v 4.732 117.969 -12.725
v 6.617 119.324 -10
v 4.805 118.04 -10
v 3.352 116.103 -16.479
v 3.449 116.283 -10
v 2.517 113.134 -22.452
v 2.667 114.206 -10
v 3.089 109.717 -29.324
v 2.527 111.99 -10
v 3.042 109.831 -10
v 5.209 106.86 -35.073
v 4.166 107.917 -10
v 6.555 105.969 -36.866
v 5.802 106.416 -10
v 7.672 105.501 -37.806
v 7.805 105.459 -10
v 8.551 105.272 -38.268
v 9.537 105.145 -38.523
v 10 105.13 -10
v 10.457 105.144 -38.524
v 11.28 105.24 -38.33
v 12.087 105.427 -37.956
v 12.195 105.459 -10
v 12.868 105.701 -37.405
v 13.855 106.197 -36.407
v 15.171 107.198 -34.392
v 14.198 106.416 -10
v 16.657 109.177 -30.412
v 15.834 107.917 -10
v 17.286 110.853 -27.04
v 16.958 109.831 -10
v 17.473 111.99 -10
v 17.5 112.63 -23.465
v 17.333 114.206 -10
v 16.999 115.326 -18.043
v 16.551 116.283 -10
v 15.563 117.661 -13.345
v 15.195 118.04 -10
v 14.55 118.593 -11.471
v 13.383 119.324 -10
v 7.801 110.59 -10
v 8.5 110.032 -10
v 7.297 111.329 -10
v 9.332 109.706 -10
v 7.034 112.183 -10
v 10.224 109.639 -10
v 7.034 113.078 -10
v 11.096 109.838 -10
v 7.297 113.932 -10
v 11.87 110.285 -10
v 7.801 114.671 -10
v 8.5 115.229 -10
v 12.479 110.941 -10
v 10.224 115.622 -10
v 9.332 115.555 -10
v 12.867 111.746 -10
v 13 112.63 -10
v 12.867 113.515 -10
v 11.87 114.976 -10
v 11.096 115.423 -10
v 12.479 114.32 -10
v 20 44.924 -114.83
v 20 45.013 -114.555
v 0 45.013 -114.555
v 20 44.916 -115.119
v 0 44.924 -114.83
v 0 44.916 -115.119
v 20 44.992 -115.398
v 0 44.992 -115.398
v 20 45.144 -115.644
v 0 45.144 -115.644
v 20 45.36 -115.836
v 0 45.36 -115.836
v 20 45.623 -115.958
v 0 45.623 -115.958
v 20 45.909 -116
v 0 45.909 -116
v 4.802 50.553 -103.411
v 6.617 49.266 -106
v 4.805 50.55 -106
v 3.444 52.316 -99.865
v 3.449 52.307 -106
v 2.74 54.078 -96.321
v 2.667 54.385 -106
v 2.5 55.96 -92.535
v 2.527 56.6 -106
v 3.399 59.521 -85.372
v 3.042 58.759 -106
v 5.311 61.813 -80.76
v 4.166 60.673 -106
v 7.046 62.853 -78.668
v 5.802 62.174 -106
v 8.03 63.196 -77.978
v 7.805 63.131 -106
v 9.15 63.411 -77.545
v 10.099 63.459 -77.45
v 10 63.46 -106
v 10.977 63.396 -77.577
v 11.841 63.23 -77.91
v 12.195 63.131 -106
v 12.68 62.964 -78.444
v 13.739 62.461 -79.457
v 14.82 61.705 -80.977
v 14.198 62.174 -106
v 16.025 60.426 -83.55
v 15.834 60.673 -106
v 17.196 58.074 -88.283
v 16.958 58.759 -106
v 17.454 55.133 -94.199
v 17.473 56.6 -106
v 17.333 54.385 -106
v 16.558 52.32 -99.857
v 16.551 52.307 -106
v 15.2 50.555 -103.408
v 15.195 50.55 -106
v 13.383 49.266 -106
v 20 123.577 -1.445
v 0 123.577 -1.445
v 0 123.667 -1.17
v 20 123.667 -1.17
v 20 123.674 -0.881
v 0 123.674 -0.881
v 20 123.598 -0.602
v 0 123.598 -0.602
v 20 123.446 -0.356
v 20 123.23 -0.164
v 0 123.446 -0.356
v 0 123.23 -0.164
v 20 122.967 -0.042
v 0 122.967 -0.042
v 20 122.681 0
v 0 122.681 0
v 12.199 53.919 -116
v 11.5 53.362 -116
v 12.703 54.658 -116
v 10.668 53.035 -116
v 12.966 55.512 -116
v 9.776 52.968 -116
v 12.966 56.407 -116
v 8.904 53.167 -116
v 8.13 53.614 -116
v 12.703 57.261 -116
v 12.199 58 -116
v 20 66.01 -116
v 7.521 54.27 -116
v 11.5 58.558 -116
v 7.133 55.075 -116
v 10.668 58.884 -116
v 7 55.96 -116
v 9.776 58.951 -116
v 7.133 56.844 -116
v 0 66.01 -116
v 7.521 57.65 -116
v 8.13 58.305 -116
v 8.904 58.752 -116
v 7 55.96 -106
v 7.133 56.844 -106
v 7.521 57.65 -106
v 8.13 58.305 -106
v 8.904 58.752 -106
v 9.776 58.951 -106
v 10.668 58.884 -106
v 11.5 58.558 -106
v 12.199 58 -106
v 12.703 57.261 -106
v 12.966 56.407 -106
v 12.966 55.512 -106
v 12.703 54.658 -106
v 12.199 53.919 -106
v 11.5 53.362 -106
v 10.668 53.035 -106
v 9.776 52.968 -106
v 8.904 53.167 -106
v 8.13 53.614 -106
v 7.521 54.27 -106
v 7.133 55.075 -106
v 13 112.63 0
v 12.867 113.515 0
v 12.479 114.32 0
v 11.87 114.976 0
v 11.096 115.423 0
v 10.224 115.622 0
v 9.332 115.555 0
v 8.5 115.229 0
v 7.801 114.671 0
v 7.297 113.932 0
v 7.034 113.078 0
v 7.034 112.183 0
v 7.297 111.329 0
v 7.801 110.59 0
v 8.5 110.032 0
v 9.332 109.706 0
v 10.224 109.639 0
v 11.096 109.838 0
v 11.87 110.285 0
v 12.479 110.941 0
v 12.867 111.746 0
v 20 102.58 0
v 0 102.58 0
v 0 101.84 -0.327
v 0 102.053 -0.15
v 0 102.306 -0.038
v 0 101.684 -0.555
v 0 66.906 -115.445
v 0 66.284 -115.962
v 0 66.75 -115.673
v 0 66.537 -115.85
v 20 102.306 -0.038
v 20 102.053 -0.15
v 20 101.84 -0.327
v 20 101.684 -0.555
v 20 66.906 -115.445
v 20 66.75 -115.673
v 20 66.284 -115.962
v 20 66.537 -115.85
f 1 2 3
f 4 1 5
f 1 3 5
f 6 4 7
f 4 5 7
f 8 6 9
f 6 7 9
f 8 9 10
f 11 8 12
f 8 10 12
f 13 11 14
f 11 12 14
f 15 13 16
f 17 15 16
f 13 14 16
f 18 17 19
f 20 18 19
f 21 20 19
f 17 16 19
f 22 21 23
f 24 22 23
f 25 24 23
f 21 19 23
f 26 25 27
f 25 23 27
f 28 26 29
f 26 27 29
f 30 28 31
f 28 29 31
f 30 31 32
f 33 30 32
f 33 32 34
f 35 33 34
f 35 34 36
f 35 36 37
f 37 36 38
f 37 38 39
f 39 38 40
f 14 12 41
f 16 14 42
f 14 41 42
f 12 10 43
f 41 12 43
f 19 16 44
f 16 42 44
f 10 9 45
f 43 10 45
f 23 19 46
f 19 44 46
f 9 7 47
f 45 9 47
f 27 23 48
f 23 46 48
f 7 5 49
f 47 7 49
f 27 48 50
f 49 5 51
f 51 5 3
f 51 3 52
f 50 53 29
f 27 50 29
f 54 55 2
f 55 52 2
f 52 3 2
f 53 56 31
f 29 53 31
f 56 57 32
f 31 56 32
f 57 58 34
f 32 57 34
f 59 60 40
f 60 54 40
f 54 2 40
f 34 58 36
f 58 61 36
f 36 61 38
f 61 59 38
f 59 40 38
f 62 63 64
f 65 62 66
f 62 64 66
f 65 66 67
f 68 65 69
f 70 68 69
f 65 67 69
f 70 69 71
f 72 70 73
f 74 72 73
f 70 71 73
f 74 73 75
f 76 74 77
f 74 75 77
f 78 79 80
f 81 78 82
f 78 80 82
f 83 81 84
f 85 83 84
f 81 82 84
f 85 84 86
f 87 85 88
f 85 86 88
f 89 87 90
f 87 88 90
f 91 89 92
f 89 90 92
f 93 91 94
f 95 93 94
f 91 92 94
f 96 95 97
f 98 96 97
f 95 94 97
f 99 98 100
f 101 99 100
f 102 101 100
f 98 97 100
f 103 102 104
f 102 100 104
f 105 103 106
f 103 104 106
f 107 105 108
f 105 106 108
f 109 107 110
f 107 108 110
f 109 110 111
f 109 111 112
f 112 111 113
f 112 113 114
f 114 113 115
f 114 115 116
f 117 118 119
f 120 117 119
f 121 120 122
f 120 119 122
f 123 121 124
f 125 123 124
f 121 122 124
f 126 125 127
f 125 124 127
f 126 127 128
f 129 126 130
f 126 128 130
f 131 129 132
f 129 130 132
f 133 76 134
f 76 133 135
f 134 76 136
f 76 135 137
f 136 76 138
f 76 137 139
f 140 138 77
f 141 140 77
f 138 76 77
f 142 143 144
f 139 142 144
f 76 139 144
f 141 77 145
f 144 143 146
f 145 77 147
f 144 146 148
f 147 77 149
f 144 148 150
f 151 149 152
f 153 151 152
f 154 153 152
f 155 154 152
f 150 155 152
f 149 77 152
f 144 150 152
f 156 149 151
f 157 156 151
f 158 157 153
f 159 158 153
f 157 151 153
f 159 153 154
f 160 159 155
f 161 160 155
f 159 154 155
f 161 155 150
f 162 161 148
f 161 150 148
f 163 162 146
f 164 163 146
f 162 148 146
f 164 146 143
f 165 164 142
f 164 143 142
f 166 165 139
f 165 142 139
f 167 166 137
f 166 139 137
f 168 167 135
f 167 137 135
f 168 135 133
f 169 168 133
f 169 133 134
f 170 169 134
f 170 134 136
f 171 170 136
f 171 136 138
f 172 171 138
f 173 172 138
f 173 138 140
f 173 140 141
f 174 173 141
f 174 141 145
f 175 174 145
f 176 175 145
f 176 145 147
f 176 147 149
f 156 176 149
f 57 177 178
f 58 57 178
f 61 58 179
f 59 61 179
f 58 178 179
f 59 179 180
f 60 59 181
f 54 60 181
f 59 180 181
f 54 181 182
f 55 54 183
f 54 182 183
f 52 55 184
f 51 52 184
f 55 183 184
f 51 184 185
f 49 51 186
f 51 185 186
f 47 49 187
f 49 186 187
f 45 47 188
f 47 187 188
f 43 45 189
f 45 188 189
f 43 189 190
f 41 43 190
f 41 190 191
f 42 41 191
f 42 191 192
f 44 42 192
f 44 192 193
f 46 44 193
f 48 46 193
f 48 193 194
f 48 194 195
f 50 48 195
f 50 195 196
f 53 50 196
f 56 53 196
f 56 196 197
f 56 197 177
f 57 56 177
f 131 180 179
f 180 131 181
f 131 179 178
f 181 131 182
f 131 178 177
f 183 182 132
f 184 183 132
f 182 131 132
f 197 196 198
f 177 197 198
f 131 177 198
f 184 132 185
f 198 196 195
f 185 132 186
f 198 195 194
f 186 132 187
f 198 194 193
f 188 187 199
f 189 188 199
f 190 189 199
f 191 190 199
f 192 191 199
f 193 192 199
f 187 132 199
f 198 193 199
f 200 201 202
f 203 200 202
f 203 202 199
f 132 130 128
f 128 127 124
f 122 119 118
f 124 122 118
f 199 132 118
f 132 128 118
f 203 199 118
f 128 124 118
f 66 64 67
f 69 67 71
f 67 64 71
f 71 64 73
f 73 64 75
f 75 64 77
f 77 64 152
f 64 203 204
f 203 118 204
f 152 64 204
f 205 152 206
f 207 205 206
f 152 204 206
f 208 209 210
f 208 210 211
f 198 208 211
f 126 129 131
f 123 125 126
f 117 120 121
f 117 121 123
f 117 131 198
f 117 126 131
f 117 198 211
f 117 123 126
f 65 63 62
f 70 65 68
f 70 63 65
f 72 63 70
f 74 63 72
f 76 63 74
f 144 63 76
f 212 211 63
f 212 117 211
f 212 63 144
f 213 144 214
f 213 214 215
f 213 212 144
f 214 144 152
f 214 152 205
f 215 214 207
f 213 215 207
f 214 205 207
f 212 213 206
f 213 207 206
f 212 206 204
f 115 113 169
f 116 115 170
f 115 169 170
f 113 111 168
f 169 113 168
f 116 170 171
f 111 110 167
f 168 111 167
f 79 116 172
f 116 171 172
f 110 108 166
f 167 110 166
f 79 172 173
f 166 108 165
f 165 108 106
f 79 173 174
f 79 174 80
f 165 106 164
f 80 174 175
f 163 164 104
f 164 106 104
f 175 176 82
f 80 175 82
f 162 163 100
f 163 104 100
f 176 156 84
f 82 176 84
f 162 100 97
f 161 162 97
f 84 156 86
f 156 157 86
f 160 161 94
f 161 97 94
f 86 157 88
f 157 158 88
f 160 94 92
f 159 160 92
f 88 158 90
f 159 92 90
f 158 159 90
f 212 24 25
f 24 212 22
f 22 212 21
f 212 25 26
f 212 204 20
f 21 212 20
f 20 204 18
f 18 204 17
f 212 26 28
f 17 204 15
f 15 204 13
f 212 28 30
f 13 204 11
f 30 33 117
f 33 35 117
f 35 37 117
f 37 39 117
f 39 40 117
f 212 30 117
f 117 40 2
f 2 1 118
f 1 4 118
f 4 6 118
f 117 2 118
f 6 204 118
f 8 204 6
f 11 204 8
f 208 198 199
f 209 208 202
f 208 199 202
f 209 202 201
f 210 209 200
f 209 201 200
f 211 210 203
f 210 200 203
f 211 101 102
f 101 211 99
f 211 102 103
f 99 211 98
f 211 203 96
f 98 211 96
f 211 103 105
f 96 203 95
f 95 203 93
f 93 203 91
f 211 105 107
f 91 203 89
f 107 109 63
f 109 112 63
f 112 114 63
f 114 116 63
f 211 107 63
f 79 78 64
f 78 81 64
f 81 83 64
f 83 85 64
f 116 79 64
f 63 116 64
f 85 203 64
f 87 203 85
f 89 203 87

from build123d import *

# Parameters (mm, degrees)
BOSS_EXTRUDE1_DEPTH = 20
SKETCH2_R           = 3
CUT_EXTRUDE5_DEPTH  = 117
CUT_EXTRUDE6_START  = -10
SKETCH5_R           = 7.5
CUT_EXTRUDE6_DEPTH  = 107
SKETCH6_R           = 3
CUT_EXTRUDE7_DEPTH  = 117
CUT_EXTRUDE8_START  = -10
SKETCH7_R           = 7.5
CUT_EXTRUDE8_DEPTH  = 107


with BuildPart() as part:
    # Sketch1 → Boss-Extrude1 (new body)
    with BuildSketch(Plane(origin=(0, 0, 0), x_dir=(0, 0, -1), z_dir=(1, 0, 0))):
        with BuildLine():
            Line((0.554855898, 101.68431358), (114.554855898, 45.013454735))
            ThreePointArc((114.554855898, 45.013454735), (115.526714295, 45.058871302), (116, 45.908913684))
            Line((116, 45.908913684), (116, 66.010337689))
            ThreePointArc((116, 66.010337689), (115.850042382, 66.537051984), (115.445144102, 66.905796637))
            Line((115.445144102, 66.905796637), (1.445144102, 123.576655482))
            ThreePointArc((1.445144102, 123.576655482), (0.473285705, 123.531238916), (0, 122.681196534))
            Line((0, 122.681196534), (0, 102.579772529))
            ThreePointArc((0, 102.579772529), (0.149957618, 102.053058233), (0.554855898, 101.68431358))
        make_face()
    extrude(amount=BOSS_EXTRUDE1_DEPTH)

    # Sketch2 → Cut-Extrude5 (cut, through all)
    with BuildSketch(Plane.XY):
        with Locations((10, 112.630484531)):
            Circle(SKETCH2_R)
    extrude(amount=-CUT_EXTRUDE5_DEPTH, mode=Mode.SUBTRACT)

    # Sketch5 → Cut-Extrude6 (cut, through all)
    with BuildSketch(Plane.XY.offset(CUT_EXTRUDE6_START)):
        with Locations((10, 112.630484531)):
            Circle(SKETCH5_R)
    extrude(amount=-CUT_EXTRUDE6_DEPTH, mode=Mode.SUBTRACT)

    # Sketch6 → Cut-Extrude7 (cut, through all)
    with BuildSketch(Plane(origin=(0, 0, -116), x_dir=(-1, 0, 0), z_dir=(0, 0, -1))):
        with Locations((-10, 55.959625686)):
            Circle(SKETCH6_R)
    extrude(amount=-CUT_EXTRUDE7_DEPTH, mode=Mode.SUBTRACT)

    # Sketch7 → Cut-Extrude8 (cut, through all)
    with BuildSketch(Plane(origin=(0, 0, -116), x_dir=(-1, 0, 0), z_dir=(0, 0, -1)).offset(CUT_EXTRUDE8_START)):
        with Locations((-10, 55.959625686)):
            Circle(SKETCH7_R)
    extrude(amount=-CUT_EXTRUDE8_DEPTH, mode=Mode.SUBTRACT)


solid = part.part
